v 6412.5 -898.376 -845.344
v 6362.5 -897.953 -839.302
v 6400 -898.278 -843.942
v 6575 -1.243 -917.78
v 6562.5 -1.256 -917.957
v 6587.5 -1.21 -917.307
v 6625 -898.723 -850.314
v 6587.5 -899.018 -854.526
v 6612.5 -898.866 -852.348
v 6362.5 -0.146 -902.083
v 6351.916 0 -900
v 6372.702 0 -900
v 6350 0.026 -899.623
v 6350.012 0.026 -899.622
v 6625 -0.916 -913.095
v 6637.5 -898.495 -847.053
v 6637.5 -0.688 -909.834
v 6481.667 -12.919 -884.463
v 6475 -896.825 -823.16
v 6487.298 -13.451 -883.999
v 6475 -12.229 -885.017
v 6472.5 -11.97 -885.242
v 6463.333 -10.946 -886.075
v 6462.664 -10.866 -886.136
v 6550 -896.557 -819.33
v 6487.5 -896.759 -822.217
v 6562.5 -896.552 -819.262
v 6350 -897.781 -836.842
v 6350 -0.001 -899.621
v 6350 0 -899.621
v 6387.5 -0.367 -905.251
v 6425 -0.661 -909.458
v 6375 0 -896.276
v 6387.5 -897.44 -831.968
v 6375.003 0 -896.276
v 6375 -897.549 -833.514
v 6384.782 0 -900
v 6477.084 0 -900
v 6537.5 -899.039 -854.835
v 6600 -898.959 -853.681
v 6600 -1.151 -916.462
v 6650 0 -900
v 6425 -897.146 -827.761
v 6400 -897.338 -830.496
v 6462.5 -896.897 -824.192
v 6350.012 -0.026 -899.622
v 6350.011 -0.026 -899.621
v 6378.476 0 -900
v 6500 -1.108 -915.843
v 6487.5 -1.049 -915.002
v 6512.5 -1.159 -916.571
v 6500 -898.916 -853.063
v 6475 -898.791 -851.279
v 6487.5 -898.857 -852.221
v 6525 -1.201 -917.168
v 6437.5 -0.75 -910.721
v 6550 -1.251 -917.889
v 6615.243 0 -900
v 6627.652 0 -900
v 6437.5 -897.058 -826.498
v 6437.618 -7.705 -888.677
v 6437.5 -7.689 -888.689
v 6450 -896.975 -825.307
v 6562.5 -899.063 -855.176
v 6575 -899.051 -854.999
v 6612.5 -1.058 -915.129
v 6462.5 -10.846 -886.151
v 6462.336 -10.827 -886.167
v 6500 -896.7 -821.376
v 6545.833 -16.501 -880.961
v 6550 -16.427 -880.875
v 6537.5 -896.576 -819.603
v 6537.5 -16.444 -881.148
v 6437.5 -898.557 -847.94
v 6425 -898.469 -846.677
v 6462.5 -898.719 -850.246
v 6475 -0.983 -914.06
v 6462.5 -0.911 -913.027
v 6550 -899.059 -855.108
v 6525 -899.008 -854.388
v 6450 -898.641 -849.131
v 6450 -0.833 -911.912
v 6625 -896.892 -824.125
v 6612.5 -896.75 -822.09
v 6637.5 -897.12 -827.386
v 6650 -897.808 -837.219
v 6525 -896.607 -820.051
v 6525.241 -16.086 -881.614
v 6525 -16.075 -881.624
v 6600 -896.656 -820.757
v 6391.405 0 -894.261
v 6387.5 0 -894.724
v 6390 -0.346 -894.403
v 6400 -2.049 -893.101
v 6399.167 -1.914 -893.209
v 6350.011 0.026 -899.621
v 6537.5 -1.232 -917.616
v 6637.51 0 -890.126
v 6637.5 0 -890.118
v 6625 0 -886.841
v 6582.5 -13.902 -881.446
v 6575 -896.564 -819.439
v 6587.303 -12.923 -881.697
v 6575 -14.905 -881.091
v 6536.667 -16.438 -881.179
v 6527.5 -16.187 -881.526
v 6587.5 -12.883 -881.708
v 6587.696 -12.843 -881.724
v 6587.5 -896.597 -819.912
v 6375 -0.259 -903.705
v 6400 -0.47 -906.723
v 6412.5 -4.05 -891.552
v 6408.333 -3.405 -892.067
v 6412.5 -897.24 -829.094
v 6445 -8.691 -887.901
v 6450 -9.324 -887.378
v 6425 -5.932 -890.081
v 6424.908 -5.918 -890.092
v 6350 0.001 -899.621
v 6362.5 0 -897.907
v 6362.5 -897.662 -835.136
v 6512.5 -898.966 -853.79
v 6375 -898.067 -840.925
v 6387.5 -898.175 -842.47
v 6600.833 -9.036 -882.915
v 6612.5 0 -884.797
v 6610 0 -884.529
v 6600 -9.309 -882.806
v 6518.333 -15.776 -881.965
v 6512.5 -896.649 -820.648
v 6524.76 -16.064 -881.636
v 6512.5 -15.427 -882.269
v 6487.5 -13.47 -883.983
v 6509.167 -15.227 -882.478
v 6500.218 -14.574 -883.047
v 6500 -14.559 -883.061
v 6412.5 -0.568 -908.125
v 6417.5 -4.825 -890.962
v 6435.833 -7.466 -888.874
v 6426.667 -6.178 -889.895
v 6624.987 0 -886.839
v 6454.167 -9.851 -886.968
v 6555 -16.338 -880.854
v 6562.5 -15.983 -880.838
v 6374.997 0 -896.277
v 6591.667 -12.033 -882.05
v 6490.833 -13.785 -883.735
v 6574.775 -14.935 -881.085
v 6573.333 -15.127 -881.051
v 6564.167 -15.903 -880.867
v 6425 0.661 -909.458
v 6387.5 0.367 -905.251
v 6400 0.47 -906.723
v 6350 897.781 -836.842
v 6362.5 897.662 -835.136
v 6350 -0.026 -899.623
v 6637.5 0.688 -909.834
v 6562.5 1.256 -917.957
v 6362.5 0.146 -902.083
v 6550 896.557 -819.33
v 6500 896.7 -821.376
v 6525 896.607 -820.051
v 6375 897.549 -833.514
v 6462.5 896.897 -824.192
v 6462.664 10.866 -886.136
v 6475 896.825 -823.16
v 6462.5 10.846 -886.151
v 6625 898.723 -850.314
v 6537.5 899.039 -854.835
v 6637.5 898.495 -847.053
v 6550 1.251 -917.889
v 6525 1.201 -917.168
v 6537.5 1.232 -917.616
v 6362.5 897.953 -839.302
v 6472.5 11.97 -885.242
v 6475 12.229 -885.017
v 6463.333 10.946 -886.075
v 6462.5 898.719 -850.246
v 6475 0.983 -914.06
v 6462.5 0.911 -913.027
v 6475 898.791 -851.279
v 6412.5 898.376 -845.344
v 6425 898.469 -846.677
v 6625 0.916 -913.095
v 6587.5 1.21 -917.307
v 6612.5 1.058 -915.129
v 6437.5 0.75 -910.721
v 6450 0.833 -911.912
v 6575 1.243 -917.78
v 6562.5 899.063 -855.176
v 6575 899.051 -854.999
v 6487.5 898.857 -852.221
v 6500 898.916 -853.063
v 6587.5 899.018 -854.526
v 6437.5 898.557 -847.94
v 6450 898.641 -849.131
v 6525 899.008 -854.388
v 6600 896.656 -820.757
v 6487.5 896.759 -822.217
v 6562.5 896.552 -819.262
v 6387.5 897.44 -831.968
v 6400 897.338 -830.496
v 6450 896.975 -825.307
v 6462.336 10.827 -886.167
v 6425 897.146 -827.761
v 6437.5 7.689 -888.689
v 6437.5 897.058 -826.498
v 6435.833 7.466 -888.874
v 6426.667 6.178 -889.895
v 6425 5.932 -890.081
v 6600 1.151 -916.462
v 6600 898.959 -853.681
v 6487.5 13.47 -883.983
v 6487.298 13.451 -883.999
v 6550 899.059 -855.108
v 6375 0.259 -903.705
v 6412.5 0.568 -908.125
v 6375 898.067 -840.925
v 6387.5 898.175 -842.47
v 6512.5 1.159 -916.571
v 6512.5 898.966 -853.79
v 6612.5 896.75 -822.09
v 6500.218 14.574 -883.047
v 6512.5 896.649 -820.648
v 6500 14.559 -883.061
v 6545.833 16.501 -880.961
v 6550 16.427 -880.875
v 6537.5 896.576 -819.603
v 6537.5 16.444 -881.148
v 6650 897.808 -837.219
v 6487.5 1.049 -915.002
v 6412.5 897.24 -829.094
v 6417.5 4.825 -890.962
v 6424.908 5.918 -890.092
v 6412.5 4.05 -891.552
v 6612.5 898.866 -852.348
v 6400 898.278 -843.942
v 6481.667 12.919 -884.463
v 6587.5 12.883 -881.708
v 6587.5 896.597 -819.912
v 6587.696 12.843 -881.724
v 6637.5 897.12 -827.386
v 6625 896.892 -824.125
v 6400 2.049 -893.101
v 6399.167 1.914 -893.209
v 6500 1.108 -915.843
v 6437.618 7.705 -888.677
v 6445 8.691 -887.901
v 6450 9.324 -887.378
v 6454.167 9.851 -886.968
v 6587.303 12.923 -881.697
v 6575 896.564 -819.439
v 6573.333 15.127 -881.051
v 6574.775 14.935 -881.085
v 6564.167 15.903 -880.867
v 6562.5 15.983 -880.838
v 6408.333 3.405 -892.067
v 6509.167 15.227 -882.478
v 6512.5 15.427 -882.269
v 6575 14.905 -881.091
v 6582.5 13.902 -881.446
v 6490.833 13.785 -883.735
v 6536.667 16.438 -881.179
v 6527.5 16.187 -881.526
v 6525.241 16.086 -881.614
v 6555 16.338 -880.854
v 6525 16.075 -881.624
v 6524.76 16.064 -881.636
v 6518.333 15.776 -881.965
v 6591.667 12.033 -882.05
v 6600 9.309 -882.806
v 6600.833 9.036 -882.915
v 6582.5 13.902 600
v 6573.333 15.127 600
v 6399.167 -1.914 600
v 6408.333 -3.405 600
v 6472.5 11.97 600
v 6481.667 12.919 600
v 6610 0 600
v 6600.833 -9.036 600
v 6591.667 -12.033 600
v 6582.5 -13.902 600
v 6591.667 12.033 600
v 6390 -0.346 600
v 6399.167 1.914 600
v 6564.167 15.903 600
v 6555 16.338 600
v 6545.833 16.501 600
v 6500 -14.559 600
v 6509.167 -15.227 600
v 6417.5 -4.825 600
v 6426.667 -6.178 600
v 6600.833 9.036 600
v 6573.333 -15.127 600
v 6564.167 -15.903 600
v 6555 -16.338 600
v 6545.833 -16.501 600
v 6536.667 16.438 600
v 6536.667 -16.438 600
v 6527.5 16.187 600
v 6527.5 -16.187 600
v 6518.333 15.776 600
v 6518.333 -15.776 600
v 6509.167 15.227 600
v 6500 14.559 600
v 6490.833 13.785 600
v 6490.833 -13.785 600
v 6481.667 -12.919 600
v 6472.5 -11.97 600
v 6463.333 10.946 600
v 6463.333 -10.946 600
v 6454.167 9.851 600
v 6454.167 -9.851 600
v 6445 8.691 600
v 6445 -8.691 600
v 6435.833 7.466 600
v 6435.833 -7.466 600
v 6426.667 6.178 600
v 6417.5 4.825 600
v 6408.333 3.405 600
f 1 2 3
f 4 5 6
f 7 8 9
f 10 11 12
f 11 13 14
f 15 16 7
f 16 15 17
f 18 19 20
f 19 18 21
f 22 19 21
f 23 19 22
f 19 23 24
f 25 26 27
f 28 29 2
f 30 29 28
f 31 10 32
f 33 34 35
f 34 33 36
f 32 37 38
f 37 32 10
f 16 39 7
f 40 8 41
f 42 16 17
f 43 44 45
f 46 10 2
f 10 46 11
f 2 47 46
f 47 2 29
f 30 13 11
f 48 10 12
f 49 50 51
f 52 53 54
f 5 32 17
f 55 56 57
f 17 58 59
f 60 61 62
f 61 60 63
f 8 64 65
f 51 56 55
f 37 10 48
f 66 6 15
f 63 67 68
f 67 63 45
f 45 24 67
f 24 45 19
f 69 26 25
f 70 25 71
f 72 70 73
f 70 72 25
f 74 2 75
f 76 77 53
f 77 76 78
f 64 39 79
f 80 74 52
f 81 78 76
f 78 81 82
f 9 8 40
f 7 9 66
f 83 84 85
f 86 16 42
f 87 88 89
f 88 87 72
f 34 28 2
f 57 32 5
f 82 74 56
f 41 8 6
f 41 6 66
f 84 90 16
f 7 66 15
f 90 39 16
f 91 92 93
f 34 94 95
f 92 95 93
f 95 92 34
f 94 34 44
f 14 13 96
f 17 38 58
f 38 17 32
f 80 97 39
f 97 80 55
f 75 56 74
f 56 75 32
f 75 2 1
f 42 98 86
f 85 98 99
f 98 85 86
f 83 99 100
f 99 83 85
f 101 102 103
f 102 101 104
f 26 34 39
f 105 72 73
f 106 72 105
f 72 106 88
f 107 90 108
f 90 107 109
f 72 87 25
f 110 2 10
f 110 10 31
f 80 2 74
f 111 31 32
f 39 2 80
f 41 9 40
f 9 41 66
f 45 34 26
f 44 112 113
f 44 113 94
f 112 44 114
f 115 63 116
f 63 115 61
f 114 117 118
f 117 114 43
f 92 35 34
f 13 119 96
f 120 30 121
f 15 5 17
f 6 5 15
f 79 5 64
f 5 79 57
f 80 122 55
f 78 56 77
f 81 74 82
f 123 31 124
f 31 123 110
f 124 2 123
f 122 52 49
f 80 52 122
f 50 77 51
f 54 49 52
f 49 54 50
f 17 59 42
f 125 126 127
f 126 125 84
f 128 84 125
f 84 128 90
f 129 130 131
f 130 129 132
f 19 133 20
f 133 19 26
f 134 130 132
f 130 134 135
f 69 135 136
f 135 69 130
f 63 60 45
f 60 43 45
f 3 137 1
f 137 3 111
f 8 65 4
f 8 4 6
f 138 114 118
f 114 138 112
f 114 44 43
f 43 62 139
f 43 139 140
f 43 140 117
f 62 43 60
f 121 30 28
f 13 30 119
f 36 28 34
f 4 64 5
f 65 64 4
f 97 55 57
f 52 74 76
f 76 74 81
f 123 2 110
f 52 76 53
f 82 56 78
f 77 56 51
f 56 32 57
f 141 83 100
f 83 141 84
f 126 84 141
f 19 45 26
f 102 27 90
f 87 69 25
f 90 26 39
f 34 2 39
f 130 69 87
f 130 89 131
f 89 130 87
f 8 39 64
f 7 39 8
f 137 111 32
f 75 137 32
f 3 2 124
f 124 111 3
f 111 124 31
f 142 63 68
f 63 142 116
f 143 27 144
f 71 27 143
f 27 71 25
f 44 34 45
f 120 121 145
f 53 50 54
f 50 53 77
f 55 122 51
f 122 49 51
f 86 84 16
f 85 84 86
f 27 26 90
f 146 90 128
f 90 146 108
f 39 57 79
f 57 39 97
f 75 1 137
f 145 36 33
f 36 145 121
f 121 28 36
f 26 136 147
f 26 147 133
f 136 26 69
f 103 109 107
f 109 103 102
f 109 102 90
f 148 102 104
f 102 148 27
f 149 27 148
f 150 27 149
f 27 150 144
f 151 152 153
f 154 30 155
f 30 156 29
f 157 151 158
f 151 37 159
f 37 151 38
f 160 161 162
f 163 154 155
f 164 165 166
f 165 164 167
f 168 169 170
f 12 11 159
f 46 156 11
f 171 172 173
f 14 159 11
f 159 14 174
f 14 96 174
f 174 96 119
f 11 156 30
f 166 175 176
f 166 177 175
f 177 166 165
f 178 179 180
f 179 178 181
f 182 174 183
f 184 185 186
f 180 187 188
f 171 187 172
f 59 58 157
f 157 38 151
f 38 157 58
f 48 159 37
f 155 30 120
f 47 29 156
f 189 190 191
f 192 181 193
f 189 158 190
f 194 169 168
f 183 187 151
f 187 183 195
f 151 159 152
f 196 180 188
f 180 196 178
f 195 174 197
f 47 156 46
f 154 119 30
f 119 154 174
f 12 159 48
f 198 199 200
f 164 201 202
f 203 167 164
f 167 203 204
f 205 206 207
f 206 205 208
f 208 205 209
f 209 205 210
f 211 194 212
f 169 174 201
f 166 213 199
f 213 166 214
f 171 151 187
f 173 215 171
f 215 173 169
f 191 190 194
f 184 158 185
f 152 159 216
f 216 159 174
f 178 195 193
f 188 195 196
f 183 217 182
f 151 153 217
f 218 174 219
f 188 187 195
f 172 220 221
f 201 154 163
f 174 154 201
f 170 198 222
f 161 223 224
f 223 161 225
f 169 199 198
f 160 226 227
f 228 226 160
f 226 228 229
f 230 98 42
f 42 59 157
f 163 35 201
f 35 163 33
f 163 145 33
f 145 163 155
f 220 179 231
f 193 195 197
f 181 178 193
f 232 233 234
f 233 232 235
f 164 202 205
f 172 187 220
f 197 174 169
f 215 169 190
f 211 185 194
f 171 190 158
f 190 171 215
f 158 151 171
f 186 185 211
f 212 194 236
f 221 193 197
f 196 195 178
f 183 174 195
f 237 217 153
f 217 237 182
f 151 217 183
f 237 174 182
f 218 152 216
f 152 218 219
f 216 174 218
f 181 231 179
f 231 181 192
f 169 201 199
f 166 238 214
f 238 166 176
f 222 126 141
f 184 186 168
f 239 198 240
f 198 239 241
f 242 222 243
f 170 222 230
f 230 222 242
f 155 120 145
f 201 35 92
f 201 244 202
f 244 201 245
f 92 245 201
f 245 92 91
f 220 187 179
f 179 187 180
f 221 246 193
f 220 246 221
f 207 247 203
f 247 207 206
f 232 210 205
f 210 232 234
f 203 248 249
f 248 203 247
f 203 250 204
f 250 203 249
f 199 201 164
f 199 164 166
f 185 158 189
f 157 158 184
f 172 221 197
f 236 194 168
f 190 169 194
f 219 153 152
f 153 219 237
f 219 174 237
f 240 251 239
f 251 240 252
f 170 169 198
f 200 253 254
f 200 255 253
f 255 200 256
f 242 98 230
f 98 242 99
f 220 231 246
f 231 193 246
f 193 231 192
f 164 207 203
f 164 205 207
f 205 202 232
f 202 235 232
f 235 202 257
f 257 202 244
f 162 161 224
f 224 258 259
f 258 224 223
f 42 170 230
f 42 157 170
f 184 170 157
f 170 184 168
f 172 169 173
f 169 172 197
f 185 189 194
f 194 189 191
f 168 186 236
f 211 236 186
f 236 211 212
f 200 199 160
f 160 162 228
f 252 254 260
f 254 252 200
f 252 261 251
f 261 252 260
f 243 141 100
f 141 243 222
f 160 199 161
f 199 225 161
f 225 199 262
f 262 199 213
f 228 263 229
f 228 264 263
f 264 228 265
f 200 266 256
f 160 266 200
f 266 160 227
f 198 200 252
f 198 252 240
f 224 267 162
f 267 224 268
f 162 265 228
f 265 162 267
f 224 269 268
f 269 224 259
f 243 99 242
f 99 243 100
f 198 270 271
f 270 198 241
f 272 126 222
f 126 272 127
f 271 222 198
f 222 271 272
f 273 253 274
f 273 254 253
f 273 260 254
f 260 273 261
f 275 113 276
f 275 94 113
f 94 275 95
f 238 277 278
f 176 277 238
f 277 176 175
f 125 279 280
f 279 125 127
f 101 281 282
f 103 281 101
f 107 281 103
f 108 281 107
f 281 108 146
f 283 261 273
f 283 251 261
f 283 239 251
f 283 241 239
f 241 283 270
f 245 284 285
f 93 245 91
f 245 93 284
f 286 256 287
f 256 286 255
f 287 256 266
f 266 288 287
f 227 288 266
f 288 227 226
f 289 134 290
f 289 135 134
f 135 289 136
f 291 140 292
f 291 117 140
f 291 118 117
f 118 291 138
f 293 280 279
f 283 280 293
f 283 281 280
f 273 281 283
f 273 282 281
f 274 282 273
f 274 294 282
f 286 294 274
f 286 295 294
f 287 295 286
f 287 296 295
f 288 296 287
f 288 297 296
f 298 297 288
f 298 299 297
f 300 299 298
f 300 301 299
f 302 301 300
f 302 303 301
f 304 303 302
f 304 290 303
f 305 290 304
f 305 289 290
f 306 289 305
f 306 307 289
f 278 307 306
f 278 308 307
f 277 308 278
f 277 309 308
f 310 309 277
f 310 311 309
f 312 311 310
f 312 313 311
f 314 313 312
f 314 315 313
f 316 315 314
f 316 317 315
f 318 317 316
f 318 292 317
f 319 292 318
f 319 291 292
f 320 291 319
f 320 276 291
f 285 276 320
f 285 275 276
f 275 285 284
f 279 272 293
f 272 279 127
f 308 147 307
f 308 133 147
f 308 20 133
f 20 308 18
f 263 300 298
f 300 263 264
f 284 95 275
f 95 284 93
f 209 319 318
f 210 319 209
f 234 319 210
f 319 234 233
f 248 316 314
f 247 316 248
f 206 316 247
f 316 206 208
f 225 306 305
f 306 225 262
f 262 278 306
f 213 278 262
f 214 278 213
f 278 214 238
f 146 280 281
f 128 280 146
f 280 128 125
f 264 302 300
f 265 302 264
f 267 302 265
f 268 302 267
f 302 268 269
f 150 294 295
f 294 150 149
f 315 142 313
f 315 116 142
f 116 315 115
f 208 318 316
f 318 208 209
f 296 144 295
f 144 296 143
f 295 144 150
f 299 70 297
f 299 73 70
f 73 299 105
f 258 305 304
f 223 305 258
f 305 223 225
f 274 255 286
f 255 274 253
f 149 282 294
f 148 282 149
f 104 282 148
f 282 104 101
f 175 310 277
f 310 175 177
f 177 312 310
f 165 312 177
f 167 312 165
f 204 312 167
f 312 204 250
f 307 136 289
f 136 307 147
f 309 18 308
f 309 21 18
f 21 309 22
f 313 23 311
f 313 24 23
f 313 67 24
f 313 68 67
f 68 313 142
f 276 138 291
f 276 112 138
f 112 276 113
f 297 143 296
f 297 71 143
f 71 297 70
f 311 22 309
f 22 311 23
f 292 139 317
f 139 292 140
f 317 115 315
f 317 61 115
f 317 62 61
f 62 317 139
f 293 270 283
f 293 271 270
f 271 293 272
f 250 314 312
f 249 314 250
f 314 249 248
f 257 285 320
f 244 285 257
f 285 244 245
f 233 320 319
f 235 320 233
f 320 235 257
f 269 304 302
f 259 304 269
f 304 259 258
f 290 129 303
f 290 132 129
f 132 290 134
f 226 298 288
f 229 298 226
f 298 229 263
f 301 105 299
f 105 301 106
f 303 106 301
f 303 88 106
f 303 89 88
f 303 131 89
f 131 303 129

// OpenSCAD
// file: ../lib/shapes.scad
// shapes.scad — small geometry helpers

// box with rounded corners, centered
module rounded_box(size, r = 40) {
  hull()
    for (x = [-size[0]/2 + r, size[0]/2 - r],
         y = [-size[1]/2 + r, size[1]/2 - r],
         z = [-size[2]/2 + r, size[2]/2 - r])
      translate([x, y, z]) sphere(r = r);
}

// rod between two points
module rod(p1, p2, d) {
  hull() {
    translate(p1) sphere(d = d);
    translate(p2) sphere(d = d);
  }
}

// symmetric NACA-4-digit-ish foil section, chord along +x, LE at origin
function naca_half(c, t, n) =
  [ for (i = [0 : n])
      let (u = i / n,
           yt = 5 * t * c * (0.2969 * sqrt(u) - 0.1260 * u
                - 0.3516 * u * u + 0.2843 * u * u * u
                - 0.1015 * u * u * u * u))
      [u * c, yt] ];

function foil_pts(c, t = 0.12, n = 24) =
  concat(naca_half(c, t, n),
         [ for (i = [n - 1 : -1 : 1])
             let (p = naca_half(c, t, n)[i]) [p[0], -p[1]] ]);
// main file
// hydrofoil.scad — retractable bow T-foil. ext 0 (stowed) .. 1 (deployed)
include <../params.scad>
use <../lib/shapes.scad>

module hydrofoil(ext = 0) {
  wing_z = lerp(foil_stow_z, foil_deploy_z, ext);
  color("dodgerblue") {
    // strut: vertical foil section, chord along x, from hull into water
    translate([foil_x + foil_strut_chord / 2, 0, wing_z])
      rotate([0, 0, 180])                       // LE forward
        linear_extrude(600 - wing_z)
          polygon(foil_pts(foil_strut_chord, 0.15));
    // main wing: span along y, slight dihedral
    for (s = [-1, 1])
      scale([1, s, 1])
        translate([foil_x + foil_chord / 2, 0, wing_z])
          rotate([4, 0, 0])                     // dihedral, tips up
            rotate([90, 0, 180])                // span +y, LE forward
              linear_extrude(foil_span / 2)
                polygon(foil_pts(foil_chord, 0.12));
  }
}

hydrofoil(1);   // demo: deployed
